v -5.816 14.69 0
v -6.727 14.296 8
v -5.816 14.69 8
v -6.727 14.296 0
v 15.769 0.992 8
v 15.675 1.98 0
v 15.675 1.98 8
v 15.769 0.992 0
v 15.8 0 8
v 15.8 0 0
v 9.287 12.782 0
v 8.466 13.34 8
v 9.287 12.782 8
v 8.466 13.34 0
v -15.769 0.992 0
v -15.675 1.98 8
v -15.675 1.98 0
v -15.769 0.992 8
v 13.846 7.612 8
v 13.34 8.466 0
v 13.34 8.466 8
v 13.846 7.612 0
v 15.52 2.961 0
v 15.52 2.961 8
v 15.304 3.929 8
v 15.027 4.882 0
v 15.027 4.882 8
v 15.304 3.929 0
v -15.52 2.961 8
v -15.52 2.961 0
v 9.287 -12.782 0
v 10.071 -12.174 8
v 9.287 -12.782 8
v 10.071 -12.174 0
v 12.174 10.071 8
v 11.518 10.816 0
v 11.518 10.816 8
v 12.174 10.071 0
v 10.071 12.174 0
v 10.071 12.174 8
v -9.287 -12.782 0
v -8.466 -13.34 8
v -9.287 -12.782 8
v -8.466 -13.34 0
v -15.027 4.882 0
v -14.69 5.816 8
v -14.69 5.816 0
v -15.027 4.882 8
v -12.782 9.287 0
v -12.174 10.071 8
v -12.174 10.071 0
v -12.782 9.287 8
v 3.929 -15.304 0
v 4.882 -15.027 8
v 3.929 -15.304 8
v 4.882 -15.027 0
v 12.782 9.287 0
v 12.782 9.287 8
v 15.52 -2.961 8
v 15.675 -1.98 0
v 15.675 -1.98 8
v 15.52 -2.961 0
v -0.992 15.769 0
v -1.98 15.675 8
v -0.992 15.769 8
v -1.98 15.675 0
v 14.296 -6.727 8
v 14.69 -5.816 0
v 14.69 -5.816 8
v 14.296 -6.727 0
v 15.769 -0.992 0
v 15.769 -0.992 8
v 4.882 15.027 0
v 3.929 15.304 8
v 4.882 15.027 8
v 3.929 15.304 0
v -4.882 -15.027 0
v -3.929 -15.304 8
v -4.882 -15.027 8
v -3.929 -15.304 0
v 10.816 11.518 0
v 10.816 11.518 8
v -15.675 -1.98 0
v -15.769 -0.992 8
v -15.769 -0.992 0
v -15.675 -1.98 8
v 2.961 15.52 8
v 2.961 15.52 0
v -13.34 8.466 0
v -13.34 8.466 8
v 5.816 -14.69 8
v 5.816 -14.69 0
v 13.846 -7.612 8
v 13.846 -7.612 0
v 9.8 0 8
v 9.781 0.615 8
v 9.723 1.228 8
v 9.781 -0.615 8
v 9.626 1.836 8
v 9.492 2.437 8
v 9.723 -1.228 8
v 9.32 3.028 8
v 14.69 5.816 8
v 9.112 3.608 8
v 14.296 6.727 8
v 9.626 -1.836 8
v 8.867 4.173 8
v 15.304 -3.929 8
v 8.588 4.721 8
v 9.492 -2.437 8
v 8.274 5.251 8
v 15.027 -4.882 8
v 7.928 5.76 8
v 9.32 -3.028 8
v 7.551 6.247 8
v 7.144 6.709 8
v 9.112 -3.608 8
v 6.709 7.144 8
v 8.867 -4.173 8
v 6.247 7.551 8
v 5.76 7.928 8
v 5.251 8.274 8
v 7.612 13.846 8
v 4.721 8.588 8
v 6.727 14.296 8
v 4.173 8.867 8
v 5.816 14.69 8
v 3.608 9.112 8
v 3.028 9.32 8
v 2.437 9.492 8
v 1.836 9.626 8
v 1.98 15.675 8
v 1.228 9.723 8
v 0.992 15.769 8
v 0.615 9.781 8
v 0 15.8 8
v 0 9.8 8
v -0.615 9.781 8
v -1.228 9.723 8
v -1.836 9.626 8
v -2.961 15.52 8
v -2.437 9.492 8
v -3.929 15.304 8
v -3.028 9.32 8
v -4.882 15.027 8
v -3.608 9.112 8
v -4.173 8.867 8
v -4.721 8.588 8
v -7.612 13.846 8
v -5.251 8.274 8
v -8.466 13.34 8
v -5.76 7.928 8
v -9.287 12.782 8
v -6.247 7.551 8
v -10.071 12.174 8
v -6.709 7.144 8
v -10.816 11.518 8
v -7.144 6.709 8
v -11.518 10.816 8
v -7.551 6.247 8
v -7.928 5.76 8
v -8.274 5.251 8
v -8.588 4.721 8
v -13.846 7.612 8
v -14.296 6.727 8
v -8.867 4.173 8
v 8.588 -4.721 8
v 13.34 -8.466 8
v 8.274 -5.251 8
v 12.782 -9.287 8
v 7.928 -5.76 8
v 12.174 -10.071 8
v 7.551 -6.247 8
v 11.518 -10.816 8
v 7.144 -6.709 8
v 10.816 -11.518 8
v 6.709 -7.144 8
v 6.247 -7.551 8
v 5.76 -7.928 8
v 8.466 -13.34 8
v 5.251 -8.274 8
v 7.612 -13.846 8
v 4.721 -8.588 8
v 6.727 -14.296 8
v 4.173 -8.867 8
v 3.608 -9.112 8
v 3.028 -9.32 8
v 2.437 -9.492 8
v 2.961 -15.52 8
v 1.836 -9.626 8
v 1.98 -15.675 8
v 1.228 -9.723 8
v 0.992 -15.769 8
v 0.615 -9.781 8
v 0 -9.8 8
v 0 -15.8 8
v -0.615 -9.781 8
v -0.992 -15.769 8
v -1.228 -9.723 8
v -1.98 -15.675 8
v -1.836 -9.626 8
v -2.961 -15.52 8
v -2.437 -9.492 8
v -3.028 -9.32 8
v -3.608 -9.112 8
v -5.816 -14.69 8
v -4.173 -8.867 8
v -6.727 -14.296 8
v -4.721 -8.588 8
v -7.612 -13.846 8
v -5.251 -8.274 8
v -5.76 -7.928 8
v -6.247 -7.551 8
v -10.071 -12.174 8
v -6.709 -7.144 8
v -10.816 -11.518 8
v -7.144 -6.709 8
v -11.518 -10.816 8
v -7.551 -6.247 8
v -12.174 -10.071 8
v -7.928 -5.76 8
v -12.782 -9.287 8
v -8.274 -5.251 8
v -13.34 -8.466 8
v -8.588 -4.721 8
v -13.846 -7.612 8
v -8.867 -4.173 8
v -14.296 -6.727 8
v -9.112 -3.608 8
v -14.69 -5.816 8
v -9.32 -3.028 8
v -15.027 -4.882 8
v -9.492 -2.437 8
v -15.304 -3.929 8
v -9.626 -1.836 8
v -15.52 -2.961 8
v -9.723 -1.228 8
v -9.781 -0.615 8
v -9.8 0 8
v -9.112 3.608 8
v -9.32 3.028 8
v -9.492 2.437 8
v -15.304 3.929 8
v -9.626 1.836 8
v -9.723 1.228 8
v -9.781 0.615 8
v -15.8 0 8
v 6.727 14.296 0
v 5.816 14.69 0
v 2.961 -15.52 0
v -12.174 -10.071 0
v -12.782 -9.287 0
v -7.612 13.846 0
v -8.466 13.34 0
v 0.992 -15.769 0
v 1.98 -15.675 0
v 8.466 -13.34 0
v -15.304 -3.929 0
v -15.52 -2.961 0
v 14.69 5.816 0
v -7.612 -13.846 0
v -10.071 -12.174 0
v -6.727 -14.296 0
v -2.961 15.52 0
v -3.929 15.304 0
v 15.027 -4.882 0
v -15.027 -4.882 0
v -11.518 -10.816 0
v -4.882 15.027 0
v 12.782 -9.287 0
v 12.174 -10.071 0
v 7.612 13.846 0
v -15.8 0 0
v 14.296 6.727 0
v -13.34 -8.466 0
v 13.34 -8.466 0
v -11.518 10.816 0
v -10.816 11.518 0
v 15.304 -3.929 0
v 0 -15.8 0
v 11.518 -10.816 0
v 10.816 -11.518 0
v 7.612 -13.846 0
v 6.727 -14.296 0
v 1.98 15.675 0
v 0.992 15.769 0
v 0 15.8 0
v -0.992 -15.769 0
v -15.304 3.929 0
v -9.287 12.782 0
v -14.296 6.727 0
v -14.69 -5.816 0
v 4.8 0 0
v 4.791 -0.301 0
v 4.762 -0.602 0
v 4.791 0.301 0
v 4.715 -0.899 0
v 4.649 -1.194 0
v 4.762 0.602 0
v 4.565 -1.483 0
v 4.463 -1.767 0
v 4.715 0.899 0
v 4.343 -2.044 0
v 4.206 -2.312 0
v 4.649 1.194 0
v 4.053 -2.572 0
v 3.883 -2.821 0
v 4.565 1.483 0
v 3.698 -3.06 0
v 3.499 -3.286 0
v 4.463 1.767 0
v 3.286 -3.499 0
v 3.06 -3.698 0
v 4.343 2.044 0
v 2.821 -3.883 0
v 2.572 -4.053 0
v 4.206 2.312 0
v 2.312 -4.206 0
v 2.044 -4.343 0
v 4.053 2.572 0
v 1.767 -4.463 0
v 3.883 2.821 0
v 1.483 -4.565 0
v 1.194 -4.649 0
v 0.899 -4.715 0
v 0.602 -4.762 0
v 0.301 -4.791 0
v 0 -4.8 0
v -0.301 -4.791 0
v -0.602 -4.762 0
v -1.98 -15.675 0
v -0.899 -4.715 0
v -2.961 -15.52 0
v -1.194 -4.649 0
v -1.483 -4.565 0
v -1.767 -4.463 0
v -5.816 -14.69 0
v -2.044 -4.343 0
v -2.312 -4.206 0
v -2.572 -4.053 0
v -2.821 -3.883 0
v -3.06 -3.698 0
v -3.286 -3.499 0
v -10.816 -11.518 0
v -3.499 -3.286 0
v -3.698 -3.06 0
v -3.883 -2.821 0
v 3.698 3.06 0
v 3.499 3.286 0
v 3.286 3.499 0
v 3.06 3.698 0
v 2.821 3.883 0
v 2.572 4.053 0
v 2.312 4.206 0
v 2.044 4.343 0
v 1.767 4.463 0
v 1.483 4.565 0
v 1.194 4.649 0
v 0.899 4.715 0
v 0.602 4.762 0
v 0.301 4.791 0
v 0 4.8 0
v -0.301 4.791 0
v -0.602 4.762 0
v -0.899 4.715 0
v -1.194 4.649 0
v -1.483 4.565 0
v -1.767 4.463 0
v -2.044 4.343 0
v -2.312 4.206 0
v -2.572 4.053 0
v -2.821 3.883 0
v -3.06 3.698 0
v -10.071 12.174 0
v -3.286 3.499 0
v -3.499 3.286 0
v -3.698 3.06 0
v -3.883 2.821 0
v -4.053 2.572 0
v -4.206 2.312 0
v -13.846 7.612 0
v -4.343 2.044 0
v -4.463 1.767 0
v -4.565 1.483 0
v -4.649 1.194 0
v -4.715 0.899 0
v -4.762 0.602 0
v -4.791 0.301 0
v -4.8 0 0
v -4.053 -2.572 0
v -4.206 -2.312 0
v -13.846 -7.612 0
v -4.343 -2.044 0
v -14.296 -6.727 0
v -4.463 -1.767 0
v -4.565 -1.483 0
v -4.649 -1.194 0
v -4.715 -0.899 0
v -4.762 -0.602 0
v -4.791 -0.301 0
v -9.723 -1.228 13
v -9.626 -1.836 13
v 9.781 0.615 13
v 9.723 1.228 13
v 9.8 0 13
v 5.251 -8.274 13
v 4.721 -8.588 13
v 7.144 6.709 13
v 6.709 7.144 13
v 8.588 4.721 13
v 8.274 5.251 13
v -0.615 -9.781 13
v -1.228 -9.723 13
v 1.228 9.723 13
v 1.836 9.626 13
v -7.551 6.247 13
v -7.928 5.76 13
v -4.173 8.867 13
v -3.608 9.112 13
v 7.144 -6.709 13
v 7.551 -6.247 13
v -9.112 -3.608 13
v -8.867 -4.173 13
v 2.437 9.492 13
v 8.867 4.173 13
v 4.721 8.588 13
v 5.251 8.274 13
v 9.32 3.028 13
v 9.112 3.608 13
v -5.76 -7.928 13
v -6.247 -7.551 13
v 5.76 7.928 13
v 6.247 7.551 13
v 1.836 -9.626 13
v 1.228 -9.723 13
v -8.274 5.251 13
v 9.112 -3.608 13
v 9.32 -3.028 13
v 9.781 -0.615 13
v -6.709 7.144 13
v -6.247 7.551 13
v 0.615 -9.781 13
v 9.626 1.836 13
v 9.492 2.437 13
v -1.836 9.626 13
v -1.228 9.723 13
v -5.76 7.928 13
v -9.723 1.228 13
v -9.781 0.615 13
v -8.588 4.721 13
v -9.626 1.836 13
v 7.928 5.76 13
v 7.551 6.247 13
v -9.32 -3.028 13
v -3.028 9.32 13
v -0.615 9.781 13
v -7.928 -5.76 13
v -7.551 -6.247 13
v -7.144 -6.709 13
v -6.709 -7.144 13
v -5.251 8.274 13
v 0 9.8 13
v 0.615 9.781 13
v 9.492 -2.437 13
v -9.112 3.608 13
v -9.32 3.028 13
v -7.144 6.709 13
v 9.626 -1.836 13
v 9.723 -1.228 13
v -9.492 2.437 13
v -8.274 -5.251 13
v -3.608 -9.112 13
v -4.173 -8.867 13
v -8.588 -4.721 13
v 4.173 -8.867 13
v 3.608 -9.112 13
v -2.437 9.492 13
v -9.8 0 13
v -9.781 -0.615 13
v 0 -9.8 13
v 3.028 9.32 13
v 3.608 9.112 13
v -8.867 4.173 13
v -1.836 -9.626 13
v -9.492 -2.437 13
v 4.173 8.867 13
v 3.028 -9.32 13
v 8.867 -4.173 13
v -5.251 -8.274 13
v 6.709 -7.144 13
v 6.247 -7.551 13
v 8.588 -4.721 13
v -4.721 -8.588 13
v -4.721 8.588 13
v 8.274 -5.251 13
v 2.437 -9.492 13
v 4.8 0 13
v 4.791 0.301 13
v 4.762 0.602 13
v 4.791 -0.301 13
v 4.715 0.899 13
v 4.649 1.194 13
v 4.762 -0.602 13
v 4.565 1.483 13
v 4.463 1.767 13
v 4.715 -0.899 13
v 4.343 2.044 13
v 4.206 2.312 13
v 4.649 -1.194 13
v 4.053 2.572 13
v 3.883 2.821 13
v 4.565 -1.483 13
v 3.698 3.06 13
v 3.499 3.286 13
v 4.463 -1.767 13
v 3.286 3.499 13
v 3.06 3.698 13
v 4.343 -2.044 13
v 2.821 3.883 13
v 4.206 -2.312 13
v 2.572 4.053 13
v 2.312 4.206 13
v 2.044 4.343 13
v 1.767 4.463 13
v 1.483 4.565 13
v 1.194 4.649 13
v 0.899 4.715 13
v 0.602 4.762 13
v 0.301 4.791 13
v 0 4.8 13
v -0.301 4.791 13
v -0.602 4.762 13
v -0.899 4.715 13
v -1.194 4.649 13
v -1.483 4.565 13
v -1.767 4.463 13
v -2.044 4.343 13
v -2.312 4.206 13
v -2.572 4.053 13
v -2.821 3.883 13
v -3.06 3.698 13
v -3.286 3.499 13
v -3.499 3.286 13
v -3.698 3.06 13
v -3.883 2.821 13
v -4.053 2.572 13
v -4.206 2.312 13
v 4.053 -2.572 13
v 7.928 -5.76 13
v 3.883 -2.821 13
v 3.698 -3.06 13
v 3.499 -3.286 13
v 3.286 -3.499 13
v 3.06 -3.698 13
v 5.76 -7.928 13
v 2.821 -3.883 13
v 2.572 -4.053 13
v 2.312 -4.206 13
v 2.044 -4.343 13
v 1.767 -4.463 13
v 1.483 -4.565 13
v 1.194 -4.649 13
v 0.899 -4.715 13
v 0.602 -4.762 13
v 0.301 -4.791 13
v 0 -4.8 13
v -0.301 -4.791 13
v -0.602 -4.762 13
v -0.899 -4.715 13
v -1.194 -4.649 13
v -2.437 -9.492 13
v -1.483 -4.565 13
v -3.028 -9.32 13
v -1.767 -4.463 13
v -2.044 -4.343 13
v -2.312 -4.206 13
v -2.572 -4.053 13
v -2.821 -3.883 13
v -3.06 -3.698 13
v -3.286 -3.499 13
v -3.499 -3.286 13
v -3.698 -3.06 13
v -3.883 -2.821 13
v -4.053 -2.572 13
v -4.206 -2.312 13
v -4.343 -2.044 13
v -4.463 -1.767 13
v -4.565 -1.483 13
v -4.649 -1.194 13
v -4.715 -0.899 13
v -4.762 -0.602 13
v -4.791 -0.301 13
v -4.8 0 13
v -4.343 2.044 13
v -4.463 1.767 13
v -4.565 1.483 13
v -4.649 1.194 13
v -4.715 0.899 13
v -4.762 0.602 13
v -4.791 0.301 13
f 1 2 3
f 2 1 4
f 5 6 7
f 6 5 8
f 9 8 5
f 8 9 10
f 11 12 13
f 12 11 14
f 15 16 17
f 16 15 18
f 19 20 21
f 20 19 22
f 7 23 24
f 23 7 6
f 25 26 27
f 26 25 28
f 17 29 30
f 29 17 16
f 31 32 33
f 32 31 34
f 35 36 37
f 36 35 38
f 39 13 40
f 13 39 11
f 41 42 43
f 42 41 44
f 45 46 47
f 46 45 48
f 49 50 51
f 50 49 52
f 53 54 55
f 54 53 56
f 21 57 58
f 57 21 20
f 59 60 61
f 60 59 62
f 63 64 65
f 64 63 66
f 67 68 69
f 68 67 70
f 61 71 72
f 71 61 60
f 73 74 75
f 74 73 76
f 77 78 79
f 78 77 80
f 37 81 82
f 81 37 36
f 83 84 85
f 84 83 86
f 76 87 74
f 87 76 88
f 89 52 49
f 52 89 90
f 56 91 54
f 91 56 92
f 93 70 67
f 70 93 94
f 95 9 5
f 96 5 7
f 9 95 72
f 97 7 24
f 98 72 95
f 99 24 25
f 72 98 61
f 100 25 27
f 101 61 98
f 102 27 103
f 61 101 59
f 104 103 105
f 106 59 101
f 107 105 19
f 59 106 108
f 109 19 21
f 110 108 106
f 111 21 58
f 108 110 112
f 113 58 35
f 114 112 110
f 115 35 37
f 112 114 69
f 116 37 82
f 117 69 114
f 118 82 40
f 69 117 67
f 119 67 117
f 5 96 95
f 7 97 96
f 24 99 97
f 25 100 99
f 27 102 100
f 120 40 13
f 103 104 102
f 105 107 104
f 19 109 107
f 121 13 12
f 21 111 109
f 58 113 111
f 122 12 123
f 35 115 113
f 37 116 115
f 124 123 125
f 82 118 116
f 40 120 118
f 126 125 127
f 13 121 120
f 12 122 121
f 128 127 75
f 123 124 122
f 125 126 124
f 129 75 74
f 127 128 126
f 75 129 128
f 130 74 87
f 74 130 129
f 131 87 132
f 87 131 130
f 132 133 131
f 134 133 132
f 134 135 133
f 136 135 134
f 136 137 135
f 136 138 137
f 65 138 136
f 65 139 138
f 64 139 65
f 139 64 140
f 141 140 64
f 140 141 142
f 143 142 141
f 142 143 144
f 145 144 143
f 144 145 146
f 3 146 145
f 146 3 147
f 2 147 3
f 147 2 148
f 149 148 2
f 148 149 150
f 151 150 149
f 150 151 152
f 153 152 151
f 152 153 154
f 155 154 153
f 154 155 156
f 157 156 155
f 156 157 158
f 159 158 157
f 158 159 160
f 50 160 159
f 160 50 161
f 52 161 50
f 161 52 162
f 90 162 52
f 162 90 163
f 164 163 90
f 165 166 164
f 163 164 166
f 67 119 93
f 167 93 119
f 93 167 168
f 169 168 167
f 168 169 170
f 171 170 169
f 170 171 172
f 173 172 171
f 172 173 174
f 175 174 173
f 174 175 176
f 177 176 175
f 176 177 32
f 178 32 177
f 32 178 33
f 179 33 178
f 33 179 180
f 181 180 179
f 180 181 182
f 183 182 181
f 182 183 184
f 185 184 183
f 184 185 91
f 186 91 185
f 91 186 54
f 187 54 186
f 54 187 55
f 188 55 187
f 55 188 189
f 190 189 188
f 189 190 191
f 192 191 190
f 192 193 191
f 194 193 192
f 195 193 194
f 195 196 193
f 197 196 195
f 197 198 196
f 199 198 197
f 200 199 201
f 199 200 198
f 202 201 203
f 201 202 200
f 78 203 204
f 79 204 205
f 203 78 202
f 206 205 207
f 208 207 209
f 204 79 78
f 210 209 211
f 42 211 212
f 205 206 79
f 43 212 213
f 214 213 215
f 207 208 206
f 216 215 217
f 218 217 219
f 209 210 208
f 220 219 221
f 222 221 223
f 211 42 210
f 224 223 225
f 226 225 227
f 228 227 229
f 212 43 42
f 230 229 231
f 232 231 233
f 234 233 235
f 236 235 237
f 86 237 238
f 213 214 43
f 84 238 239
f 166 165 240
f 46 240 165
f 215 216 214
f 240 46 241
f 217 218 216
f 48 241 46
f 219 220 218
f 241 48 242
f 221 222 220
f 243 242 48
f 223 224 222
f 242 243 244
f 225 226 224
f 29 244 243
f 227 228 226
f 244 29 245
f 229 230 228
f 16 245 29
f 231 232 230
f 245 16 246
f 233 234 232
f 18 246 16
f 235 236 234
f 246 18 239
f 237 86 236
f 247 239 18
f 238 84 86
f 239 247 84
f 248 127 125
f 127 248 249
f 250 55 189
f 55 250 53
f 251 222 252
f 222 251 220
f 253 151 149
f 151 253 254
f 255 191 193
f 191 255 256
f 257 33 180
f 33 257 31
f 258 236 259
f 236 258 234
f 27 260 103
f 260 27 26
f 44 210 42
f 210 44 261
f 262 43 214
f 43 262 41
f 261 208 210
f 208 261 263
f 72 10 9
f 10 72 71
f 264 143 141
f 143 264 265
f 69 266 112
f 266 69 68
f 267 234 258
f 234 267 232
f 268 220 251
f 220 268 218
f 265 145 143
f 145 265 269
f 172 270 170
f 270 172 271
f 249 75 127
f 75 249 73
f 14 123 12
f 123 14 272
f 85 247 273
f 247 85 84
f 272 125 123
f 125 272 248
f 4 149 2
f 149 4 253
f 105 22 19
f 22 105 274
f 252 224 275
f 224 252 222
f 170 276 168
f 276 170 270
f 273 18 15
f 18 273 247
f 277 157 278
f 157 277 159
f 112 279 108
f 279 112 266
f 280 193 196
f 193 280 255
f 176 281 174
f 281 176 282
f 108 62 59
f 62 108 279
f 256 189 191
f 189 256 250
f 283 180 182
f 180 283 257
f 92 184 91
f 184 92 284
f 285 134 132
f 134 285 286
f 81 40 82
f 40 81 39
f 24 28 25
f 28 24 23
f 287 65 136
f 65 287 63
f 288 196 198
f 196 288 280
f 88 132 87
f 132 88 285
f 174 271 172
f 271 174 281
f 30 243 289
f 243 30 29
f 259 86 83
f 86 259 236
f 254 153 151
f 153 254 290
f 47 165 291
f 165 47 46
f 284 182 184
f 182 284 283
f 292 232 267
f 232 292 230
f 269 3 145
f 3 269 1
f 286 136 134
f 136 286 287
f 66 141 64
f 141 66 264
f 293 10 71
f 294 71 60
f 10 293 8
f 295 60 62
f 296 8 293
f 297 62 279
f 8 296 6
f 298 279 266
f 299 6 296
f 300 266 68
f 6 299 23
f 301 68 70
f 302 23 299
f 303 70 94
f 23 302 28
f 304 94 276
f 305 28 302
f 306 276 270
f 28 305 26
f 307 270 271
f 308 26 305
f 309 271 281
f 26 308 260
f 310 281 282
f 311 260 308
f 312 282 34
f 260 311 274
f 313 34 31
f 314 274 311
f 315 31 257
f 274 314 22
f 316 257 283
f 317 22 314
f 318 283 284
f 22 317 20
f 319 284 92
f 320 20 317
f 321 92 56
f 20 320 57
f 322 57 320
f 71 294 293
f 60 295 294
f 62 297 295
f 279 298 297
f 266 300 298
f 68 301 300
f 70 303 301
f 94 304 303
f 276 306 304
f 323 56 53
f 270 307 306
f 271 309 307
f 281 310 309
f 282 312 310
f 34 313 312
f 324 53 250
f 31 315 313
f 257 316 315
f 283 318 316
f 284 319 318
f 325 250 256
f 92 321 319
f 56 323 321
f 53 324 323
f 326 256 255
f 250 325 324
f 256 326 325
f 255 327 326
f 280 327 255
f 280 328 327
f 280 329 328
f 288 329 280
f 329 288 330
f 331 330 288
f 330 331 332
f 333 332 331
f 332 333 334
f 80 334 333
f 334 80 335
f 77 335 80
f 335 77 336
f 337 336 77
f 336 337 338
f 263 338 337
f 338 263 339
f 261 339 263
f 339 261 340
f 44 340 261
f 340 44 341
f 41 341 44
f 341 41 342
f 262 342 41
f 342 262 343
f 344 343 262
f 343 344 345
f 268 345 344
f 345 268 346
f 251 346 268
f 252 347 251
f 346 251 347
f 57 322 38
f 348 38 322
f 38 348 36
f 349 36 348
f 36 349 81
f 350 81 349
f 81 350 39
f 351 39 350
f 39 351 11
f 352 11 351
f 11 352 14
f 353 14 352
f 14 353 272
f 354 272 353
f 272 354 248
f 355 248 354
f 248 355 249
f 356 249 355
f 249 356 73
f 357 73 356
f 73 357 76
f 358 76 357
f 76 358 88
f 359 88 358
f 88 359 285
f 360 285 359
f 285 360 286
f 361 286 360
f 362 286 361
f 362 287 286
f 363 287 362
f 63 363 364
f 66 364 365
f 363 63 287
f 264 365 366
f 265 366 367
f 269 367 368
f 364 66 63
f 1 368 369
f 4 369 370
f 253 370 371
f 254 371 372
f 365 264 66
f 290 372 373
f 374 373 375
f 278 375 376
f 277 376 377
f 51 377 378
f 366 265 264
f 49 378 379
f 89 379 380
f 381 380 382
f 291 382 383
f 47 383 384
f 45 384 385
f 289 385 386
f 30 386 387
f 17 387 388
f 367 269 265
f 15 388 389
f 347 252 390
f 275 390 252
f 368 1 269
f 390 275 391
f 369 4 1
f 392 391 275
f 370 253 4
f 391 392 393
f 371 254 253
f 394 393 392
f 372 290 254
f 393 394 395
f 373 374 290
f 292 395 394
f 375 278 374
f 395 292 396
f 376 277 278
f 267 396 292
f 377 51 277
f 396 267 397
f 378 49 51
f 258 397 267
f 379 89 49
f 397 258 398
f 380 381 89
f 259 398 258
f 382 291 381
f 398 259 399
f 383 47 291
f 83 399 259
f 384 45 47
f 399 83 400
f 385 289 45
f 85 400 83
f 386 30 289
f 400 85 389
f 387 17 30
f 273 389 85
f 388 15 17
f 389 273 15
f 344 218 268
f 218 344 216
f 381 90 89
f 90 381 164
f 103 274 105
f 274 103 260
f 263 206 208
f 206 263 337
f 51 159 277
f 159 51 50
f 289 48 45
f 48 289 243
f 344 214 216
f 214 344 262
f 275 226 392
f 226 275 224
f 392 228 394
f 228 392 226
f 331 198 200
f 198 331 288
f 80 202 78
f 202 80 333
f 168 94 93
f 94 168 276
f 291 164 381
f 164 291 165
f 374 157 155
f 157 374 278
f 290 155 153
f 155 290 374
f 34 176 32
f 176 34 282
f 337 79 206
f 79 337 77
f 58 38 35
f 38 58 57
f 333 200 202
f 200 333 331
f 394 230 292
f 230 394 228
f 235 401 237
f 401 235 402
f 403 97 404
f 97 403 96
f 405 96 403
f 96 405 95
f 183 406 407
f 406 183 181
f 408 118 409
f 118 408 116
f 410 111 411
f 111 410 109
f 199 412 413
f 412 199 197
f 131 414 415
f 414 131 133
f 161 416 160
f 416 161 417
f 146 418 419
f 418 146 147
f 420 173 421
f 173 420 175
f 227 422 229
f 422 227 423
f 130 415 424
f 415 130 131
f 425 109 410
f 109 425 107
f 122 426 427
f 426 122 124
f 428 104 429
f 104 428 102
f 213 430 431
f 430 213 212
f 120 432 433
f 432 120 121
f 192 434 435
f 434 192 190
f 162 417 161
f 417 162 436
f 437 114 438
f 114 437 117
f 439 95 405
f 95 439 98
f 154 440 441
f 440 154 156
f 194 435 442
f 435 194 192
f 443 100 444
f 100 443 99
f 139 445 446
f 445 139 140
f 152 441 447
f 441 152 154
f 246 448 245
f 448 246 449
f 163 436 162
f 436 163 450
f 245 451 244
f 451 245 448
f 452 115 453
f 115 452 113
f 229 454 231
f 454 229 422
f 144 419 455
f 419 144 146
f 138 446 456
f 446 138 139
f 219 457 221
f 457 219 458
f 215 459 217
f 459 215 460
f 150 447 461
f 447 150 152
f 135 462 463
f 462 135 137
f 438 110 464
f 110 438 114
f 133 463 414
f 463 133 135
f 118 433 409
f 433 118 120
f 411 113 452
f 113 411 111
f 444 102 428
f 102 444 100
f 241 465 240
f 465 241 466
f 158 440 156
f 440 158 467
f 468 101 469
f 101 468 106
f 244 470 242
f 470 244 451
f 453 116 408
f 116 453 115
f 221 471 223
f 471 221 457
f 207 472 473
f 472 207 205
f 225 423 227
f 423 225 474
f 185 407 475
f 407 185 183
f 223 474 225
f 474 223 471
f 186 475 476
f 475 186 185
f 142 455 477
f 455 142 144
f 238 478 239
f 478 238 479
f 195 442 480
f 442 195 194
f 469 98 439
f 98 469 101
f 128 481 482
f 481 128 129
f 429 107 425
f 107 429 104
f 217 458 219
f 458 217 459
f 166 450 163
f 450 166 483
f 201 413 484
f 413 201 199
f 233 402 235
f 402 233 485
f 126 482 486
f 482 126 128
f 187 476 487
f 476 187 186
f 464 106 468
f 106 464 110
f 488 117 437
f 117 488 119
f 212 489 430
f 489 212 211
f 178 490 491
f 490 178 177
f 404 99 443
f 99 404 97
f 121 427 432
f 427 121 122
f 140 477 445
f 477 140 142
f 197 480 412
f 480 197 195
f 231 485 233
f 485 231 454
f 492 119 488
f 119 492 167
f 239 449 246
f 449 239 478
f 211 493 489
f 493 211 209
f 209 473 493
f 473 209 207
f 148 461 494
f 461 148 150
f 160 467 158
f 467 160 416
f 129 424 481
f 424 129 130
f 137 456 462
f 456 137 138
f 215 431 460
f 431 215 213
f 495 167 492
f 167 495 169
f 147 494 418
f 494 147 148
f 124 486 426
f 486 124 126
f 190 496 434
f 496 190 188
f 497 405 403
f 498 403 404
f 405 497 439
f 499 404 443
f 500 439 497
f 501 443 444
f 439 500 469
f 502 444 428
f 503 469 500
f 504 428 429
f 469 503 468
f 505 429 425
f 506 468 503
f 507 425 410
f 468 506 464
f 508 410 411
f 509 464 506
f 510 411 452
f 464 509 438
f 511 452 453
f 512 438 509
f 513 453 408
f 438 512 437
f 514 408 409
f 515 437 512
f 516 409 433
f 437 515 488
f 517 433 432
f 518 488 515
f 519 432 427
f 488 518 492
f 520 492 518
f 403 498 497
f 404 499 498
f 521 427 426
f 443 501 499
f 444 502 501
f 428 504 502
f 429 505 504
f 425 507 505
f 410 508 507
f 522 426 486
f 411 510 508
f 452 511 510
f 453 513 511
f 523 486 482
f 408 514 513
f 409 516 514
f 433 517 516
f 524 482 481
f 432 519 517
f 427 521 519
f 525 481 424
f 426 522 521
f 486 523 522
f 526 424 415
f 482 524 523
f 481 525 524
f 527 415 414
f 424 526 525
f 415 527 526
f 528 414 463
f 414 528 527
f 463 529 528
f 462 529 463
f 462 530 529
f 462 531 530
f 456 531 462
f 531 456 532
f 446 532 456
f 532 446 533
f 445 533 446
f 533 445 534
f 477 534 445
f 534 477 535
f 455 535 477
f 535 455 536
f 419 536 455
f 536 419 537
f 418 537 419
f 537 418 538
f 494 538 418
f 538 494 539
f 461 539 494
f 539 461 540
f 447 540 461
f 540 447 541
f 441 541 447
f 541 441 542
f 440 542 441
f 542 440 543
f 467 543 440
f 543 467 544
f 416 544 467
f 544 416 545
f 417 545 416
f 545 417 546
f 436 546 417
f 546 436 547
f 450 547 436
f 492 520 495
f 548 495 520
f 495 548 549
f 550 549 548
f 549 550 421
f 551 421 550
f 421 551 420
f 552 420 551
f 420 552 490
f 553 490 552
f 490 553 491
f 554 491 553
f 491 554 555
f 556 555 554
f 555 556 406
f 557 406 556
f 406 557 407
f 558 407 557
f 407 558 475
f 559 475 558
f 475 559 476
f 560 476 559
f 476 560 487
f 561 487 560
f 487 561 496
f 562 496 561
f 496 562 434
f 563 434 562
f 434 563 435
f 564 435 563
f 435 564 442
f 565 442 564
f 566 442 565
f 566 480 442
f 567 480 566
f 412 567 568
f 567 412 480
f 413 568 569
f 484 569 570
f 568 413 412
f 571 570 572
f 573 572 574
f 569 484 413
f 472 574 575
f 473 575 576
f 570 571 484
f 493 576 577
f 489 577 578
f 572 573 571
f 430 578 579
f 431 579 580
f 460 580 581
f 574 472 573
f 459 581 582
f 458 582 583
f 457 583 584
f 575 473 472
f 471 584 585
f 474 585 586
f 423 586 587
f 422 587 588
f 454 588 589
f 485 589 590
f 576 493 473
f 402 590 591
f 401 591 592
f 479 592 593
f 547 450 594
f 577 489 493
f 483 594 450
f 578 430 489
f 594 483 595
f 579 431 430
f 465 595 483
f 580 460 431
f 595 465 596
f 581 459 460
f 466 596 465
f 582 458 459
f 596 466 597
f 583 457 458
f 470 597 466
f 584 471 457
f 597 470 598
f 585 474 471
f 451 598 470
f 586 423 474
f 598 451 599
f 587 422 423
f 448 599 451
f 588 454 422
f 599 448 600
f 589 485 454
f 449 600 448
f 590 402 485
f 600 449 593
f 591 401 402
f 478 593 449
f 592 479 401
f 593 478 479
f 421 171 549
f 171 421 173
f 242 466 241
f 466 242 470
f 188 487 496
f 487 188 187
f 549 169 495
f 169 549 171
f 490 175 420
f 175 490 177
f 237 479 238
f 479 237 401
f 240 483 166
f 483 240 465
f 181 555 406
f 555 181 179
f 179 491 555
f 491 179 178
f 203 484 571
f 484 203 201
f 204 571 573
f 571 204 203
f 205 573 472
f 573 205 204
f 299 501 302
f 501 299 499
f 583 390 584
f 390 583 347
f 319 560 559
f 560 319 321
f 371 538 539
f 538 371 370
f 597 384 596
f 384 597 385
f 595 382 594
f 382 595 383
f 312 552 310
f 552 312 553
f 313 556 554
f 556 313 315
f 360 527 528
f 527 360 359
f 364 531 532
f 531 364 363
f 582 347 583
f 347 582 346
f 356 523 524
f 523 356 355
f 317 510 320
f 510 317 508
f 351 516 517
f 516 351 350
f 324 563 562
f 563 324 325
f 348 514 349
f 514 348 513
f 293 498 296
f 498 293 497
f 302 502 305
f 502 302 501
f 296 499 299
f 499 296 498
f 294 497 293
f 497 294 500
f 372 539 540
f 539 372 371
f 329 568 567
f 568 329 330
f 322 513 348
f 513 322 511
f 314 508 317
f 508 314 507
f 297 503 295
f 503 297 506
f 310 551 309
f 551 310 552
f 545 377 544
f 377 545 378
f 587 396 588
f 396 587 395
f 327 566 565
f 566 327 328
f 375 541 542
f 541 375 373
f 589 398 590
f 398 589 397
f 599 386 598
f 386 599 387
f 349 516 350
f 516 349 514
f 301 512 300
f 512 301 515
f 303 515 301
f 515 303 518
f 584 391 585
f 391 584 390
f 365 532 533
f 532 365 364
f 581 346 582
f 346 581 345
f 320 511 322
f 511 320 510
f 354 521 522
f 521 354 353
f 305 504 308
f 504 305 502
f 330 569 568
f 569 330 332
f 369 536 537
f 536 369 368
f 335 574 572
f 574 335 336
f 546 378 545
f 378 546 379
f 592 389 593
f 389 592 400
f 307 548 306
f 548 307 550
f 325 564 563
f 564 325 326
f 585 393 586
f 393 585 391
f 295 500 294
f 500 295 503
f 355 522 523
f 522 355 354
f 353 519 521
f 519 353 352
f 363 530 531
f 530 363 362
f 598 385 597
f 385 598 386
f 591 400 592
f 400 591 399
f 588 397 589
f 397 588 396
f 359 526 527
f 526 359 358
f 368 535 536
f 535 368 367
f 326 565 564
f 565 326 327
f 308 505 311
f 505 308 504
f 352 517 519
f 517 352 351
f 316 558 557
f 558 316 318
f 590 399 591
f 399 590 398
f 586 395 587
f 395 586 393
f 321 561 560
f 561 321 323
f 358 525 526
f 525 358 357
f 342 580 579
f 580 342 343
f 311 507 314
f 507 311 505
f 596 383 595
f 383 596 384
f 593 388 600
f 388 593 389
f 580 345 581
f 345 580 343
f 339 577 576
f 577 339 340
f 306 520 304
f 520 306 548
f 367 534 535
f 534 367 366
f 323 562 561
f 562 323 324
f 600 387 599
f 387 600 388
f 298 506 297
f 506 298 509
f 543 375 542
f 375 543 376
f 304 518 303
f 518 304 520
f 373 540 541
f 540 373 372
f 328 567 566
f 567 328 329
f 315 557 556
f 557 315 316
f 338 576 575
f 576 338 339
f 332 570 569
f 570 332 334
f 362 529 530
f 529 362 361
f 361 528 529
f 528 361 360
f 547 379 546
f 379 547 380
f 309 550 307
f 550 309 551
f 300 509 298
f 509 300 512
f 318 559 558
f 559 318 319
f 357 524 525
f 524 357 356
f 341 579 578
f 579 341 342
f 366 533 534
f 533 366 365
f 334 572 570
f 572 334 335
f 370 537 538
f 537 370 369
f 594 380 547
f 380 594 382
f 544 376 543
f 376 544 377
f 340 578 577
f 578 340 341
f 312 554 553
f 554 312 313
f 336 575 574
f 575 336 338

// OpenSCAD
D_out = 32;
D_in = 20;
D_drill=10;

// calc radius and a bit smaller for tollerance
tollerance = 0.2;
r_out = (D_out/2) - tollerance;
r_in = (D_in/2) - tollerance;
r_drill=(D_drill/2) - tollerance;

// calc the hight 
h_out = D_out /4;
h_in = D_in /4;
h_drill = h_out + h_in + 1;


module create_bearing_press() 
{
    cylinder(h=h_out, r=r_out, center=false, $fn = 100);

    translate([0,0,h_out])
    cylinder(h=h_in, r=r_in, center=false, $fn = 100);
}

// drill hole in the middle
difference()
 {
     create_bearing_press();
     
     translate([0,0,-0.5])
     cylinder(h=h_drill, r=r_drill, center=false, $fn = 100);
 }
